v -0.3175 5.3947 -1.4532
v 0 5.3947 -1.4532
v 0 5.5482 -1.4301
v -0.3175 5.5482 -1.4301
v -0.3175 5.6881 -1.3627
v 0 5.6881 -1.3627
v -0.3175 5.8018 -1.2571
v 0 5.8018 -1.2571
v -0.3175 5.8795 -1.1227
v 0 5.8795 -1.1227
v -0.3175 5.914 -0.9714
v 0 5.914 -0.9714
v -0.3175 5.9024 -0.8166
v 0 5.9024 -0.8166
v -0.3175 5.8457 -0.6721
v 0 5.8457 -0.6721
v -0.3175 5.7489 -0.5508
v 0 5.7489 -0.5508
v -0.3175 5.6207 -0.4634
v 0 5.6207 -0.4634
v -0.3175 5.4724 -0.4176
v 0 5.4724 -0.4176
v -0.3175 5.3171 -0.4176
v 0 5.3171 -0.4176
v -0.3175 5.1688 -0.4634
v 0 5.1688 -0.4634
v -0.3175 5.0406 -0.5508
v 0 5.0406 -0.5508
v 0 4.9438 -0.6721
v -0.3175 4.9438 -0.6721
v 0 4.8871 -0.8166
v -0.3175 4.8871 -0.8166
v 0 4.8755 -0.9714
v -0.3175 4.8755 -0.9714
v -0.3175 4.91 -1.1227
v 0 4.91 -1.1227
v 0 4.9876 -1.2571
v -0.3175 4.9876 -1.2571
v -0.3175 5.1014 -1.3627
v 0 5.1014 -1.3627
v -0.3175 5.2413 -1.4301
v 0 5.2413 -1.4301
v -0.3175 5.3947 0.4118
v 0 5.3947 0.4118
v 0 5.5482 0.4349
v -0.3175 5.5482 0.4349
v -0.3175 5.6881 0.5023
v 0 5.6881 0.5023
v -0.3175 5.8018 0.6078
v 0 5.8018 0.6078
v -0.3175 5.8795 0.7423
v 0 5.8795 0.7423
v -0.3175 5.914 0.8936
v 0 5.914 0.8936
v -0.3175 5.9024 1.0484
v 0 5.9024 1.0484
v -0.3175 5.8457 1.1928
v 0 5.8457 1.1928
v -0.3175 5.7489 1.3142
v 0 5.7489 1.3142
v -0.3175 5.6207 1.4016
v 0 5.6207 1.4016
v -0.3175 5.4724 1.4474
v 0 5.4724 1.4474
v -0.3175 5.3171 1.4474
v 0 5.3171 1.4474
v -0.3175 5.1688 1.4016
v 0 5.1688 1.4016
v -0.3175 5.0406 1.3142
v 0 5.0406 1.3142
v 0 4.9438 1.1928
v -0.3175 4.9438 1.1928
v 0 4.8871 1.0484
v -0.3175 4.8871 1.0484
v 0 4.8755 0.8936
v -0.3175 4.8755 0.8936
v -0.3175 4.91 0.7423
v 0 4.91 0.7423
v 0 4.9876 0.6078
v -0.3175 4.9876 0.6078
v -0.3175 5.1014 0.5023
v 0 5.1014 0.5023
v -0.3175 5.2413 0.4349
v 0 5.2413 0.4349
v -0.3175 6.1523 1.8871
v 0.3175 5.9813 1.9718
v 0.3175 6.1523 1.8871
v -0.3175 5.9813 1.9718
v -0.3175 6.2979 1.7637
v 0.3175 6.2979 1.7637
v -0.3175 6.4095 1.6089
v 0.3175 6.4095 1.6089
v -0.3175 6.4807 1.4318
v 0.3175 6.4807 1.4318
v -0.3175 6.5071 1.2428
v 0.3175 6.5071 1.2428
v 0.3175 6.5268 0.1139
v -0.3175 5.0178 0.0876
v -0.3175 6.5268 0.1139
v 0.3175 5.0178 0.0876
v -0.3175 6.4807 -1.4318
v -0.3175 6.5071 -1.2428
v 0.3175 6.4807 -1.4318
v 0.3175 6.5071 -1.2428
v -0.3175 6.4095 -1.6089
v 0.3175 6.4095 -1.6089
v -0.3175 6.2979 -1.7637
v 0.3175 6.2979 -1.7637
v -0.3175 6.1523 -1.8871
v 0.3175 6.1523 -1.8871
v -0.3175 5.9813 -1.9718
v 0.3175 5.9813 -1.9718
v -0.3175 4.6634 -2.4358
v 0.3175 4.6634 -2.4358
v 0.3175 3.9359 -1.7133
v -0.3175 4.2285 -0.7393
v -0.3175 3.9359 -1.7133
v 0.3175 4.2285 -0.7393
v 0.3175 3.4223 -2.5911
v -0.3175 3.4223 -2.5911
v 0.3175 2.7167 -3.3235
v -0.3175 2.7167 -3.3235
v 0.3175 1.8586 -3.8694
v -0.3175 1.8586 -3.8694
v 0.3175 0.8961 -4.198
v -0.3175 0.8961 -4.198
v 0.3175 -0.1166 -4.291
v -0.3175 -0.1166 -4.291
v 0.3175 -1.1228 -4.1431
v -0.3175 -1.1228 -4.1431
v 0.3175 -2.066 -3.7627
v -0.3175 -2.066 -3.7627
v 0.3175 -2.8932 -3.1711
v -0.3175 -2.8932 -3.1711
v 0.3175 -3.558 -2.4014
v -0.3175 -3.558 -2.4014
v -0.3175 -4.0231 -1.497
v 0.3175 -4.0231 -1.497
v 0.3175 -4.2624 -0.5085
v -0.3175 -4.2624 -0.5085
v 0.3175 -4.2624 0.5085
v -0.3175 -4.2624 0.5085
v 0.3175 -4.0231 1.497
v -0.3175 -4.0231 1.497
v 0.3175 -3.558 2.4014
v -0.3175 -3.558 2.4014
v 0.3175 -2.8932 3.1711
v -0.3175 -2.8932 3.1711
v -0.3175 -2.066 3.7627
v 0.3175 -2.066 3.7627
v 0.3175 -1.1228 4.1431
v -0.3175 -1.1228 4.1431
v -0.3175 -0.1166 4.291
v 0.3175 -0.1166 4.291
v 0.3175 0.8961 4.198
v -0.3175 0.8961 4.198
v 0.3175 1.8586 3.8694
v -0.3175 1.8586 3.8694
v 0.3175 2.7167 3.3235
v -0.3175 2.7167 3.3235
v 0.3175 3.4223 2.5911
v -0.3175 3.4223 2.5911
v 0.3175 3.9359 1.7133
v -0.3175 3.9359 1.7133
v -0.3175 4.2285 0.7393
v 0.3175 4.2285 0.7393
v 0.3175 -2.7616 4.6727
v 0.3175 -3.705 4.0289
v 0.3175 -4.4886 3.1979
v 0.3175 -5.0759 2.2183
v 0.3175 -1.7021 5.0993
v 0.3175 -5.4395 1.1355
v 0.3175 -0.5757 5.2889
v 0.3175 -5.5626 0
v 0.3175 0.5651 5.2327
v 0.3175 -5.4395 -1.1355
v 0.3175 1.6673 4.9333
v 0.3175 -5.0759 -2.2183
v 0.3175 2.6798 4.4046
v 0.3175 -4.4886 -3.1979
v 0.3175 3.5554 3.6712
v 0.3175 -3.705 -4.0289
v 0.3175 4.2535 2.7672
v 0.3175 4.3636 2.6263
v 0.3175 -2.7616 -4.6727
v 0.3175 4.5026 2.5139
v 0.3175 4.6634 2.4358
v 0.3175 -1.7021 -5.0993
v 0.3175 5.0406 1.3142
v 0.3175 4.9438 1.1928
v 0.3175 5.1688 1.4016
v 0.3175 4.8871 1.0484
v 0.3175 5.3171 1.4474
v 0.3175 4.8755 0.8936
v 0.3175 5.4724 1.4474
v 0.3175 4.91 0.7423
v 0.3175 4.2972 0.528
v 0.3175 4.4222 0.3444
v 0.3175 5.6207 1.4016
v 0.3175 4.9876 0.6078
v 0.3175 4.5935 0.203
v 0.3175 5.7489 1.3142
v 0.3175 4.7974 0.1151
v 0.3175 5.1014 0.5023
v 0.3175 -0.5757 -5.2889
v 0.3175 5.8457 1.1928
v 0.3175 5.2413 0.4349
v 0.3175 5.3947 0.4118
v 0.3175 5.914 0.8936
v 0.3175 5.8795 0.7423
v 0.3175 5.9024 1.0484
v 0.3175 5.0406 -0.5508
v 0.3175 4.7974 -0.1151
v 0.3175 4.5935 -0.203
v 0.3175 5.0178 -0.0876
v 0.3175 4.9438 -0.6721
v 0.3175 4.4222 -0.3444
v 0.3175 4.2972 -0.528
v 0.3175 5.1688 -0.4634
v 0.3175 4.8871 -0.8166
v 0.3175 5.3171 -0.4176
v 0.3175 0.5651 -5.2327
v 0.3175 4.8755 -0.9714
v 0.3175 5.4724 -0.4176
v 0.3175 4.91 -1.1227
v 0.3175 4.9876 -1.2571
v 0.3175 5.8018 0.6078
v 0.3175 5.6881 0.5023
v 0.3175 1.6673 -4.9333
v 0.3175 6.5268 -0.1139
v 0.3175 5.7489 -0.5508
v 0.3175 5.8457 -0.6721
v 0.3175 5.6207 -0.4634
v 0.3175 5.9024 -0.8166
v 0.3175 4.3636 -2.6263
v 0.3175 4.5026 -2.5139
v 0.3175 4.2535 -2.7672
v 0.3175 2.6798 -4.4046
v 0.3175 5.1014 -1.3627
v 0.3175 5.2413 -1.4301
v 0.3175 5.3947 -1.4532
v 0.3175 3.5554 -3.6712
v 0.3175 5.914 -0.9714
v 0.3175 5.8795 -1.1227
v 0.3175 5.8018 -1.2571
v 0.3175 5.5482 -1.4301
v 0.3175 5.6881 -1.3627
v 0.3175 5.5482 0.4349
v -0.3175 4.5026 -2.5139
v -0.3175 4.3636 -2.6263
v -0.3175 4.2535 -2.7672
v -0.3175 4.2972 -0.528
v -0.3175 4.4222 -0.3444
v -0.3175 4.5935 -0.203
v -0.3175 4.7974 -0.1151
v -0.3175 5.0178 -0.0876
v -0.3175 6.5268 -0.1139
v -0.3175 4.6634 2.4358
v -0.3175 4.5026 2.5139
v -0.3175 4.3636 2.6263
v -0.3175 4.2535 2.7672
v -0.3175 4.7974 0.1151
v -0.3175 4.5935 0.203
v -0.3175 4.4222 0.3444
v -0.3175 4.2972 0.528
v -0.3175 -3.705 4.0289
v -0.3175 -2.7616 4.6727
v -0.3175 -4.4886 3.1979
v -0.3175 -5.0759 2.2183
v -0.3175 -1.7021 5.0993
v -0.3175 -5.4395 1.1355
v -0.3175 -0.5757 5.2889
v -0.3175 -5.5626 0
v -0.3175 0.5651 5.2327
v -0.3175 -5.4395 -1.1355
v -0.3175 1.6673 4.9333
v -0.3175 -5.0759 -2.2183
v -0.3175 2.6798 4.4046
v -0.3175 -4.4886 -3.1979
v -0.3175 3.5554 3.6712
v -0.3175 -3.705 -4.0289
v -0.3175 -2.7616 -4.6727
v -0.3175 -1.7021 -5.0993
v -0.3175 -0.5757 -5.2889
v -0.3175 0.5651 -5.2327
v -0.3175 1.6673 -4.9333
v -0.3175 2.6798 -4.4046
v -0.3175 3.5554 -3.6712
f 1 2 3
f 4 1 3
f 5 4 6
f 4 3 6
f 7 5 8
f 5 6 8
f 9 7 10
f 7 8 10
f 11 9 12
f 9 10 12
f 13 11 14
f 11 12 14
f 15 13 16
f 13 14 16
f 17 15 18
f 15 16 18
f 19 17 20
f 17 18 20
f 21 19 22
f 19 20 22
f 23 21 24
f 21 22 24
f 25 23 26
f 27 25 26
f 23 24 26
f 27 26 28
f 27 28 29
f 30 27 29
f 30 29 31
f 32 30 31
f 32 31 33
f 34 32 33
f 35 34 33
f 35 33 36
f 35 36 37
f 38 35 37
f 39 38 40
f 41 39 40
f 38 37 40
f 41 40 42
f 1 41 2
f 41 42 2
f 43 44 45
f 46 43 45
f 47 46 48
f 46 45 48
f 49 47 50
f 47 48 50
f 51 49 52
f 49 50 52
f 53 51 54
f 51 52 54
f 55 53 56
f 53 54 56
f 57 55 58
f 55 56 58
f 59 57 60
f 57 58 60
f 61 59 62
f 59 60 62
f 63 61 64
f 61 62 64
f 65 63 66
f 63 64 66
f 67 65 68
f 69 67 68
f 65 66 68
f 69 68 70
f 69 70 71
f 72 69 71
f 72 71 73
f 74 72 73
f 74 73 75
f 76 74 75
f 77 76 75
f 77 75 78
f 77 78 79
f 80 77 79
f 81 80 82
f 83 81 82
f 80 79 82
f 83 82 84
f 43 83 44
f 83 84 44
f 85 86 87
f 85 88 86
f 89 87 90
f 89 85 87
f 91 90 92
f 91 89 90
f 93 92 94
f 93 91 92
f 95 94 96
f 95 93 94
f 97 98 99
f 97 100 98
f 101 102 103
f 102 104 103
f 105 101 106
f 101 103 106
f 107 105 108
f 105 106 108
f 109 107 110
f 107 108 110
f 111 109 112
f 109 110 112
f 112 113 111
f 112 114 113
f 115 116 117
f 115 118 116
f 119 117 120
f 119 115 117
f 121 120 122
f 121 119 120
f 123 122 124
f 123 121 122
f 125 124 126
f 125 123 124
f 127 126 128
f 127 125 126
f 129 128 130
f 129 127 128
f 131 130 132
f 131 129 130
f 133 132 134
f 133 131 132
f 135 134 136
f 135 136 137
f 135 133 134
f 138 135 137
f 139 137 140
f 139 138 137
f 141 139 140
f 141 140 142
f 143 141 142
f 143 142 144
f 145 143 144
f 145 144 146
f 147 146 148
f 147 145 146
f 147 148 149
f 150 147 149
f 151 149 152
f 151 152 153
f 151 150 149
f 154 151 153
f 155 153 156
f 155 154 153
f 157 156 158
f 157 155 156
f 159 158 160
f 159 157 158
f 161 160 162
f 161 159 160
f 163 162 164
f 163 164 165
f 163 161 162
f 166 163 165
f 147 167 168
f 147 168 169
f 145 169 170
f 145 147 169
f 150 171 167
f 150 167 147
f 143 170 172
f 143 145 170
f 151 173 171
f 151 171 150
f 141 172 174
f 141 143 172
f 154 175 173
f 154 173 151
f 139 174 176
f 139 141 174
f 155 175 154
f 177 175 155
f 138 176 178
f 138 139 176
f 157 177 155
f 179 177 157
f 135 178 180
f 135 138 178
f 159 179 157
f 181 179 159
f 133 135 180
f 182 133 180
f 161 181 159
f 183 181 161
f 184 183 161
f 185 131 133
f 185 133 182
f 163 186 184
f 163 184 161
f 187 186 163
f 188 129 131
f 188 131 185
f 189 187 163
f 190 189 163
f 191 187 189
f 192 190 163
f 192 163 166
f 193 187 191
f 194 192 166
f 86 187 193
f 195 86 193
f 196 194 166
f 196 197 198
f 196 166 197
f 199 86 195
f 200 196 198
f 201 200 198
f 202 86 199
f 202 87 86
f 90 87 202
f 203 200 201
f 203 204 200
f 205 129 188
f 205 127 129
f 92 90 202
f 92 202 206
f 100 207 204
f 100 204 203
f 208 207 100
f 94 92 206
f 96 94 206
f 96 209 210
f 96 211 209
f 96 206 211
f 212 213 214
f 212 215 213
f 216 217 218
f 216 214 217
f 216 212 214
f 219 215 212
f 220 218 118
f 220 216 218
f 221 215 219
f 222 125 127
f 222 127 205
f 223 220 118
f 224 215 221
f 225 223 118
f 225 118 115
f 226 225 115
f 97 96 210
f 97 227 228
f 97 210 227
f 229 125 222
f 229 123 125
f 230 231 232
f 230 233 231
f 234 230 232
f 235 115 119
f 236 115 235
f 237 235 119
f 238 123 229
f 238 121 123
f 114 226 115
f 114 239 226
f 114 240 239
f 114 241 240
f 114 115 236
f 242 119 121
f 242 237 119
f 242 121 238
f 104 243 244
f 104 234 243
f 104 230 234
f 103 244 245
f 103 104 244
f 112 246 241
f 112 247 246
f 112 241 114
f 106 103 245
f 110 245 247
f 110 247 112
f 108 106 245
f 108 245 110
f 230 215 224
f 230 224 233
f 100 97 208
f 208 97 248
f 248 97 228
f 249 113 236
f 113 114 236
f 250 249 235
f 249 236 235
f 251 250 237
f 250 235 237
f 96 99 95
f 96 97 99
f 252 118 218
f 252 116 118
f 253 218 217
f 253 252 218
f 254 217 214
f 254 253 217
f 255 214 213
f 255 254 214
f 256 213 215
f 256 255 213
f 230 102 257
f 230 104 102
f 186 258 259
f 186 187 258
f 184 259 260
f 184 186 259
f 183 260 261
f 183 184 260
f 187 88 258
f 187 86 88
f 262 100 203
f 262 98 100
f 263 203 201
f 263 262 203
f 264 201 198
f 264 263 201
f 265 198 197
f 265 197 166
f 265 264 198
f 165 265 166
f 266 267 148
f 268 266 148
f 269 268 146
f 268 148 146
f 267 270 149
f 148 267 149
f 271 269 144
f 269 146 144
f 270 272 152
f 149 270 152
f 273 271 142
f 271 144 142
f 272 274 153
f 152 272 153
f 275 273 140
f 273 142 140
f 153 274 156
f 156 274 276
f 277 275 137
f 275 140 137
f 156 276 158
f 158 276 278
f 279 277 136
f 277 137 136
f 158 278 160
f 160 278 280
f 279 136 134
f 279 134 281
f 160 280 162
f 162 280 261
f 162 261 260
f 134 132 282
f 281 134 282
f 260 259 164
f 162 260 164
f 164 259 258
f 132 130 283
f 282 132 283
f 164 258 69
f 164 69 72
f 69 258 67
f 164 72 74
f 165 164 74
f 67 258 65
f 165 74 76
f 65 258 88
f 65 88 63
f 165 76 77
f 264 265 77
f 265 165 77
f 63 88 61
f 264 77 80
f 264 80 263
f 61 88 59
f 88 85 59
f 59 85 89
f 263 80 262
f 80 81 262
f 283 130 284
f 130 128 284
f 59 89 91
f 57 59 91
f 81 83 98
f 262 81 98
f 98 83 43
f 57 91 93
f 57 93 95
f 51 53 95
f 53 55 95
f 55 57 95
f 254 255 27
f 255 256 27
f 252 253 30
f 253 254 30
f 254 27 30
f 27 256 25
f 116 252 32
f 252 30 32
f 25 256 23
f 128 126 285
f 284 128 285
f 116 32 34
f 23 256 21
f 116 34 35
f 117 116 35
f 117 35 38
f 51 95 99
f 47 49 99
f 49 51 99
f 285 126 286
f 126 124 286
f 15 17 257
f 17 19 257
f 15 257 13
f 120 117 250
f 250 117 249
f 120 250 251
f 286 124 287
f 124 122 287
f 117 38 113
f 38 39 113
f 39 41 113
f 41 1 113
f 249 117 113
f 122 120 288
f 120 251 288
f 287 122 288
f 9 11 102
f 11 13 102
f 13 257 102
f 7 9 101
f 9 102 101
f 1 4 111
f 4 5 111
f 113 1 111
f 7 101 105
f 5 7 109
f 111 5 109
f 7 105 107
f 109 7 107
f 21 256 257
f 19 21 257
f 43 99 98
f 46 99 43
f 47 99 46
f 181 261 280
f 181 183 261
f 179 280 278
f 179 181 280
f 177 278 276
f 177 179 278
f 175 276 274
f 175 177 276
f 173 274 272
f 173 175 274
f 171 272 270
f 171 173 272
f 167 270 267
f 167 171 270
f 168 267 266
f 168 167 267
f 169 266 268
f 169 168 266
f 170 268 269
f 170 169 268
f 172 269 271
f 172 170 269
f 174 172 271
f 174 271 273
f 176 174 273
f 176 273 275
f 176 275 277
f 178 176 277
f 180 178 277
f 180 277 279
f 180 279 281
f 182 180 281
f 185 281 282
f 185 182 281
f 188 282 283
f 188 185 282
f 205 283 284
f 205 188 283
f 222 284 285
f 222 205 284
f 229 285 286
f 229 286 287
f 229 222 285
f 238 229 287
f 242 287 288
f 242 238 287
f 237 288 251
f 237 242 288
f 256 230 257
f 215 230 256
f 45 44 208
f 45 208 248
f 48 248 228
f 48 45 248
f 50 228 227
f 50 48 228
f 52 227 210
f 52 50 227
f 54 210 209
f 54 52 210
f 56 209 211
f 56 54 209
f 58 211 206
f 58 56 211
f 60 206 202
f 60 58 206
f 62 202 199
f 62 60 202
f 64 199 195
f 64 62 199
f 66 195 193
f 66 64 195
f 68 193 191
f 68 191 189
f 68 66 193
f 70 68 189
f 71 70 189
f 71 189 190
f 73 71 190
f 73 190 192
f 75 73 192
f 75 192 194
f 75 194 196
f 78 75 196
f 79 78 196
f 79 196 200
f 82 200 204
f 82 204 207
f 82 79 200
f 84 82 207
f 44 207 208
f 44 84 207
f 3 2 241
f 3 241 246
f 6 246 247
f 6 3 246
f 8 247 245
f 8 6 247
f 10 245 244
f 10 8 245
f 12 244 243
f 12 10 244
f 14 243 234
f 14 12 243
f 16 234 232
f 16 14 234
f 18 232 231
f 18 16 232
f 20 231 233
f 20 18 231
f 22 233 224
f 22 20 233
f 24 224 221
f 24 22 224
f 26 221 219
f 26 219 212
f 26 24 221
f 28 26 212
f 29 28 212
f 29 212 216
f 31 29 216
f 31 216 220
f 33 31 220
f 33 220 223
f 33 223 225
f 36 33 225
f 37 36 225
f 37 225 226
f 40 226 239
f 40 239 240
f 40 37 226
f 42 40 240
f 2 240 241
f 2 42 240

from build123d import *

# Parameters (mm, degrees)
SKETCH3_R                = 0.5207
BOSS_EXTRUDE1_DEPTH      = 0.3175
BOSS_EXTRUDE1_DEPTH_BACK = 0.3175
FILLET1_R                = 0.7874


with BuildPart() as part:
    # Sketch3 → Boss-Extrude1 (new body, two sides)
    with BuildSketch(Plane(origin=(0, 0, 0), x_dir=(0, 0, -1), z_dir=(1, 0, 0))) as boss_extrude1_sk:
        with BuildLine():
            Line((-1.790070495, 6.49754857), (-2.532309488, 4.3891842))
            ThreePointArc((-2.532309488, 4.3891842), (0, -5.5626), (2.532309488, 4.3891842))
            Line((2.532309488, 4.3891842), (1.790070495, 6.49754857))
            Line((1.790070495, 6.49754857), (0.113925819, 6.526805784))
            Line((0.113925819, 6.526805784), (0.0749162, 4.291946216))
            ThreePointArc((0.0749162, 4.291946216), (0, -4.2926), (-0.0749162, 4.291946216))
            Line((-0.0749162, 4.291946216), (-0.113925819, 6.526805784))
            Line((-0.113925819, 6.526805784), (-1.790070495, 6.49754857))
        make_face()
        with Locations((-0.932493347, 5.394747393)):
            Circle(SKETCH3_R, mode=Mode.SUBTRACT)
        with Locations((0.932493347, 5.394747393)):
            Circle(SKETCH3_R, mode=Mode.SUBTRACT)
    extrude(amount=BOSS_EXTRUDE1_DEPTH)
    extrude(boss_extrude1_sk.sketch, amount=-BOSS_EXTRUDE1_DEPTH_BACK)

    # Fillet1
    fillet1_edges = [part.edges().sort_by_distance(p)[0] for p in [
        (0, 4.3891842, 2.532309488),
        (0, 6.49754857, 1.790070495),
        (0, 4.291946216, 0.0749162),
        (0, 4.291946216, -0.0749162),
        (0, 6.49754857, -1.790070495),
        (0, 4.3891842, -2.532309488),
    ]]
    fillet(fillet1_edges, radius=FILLET1_R)


solid = part.part
